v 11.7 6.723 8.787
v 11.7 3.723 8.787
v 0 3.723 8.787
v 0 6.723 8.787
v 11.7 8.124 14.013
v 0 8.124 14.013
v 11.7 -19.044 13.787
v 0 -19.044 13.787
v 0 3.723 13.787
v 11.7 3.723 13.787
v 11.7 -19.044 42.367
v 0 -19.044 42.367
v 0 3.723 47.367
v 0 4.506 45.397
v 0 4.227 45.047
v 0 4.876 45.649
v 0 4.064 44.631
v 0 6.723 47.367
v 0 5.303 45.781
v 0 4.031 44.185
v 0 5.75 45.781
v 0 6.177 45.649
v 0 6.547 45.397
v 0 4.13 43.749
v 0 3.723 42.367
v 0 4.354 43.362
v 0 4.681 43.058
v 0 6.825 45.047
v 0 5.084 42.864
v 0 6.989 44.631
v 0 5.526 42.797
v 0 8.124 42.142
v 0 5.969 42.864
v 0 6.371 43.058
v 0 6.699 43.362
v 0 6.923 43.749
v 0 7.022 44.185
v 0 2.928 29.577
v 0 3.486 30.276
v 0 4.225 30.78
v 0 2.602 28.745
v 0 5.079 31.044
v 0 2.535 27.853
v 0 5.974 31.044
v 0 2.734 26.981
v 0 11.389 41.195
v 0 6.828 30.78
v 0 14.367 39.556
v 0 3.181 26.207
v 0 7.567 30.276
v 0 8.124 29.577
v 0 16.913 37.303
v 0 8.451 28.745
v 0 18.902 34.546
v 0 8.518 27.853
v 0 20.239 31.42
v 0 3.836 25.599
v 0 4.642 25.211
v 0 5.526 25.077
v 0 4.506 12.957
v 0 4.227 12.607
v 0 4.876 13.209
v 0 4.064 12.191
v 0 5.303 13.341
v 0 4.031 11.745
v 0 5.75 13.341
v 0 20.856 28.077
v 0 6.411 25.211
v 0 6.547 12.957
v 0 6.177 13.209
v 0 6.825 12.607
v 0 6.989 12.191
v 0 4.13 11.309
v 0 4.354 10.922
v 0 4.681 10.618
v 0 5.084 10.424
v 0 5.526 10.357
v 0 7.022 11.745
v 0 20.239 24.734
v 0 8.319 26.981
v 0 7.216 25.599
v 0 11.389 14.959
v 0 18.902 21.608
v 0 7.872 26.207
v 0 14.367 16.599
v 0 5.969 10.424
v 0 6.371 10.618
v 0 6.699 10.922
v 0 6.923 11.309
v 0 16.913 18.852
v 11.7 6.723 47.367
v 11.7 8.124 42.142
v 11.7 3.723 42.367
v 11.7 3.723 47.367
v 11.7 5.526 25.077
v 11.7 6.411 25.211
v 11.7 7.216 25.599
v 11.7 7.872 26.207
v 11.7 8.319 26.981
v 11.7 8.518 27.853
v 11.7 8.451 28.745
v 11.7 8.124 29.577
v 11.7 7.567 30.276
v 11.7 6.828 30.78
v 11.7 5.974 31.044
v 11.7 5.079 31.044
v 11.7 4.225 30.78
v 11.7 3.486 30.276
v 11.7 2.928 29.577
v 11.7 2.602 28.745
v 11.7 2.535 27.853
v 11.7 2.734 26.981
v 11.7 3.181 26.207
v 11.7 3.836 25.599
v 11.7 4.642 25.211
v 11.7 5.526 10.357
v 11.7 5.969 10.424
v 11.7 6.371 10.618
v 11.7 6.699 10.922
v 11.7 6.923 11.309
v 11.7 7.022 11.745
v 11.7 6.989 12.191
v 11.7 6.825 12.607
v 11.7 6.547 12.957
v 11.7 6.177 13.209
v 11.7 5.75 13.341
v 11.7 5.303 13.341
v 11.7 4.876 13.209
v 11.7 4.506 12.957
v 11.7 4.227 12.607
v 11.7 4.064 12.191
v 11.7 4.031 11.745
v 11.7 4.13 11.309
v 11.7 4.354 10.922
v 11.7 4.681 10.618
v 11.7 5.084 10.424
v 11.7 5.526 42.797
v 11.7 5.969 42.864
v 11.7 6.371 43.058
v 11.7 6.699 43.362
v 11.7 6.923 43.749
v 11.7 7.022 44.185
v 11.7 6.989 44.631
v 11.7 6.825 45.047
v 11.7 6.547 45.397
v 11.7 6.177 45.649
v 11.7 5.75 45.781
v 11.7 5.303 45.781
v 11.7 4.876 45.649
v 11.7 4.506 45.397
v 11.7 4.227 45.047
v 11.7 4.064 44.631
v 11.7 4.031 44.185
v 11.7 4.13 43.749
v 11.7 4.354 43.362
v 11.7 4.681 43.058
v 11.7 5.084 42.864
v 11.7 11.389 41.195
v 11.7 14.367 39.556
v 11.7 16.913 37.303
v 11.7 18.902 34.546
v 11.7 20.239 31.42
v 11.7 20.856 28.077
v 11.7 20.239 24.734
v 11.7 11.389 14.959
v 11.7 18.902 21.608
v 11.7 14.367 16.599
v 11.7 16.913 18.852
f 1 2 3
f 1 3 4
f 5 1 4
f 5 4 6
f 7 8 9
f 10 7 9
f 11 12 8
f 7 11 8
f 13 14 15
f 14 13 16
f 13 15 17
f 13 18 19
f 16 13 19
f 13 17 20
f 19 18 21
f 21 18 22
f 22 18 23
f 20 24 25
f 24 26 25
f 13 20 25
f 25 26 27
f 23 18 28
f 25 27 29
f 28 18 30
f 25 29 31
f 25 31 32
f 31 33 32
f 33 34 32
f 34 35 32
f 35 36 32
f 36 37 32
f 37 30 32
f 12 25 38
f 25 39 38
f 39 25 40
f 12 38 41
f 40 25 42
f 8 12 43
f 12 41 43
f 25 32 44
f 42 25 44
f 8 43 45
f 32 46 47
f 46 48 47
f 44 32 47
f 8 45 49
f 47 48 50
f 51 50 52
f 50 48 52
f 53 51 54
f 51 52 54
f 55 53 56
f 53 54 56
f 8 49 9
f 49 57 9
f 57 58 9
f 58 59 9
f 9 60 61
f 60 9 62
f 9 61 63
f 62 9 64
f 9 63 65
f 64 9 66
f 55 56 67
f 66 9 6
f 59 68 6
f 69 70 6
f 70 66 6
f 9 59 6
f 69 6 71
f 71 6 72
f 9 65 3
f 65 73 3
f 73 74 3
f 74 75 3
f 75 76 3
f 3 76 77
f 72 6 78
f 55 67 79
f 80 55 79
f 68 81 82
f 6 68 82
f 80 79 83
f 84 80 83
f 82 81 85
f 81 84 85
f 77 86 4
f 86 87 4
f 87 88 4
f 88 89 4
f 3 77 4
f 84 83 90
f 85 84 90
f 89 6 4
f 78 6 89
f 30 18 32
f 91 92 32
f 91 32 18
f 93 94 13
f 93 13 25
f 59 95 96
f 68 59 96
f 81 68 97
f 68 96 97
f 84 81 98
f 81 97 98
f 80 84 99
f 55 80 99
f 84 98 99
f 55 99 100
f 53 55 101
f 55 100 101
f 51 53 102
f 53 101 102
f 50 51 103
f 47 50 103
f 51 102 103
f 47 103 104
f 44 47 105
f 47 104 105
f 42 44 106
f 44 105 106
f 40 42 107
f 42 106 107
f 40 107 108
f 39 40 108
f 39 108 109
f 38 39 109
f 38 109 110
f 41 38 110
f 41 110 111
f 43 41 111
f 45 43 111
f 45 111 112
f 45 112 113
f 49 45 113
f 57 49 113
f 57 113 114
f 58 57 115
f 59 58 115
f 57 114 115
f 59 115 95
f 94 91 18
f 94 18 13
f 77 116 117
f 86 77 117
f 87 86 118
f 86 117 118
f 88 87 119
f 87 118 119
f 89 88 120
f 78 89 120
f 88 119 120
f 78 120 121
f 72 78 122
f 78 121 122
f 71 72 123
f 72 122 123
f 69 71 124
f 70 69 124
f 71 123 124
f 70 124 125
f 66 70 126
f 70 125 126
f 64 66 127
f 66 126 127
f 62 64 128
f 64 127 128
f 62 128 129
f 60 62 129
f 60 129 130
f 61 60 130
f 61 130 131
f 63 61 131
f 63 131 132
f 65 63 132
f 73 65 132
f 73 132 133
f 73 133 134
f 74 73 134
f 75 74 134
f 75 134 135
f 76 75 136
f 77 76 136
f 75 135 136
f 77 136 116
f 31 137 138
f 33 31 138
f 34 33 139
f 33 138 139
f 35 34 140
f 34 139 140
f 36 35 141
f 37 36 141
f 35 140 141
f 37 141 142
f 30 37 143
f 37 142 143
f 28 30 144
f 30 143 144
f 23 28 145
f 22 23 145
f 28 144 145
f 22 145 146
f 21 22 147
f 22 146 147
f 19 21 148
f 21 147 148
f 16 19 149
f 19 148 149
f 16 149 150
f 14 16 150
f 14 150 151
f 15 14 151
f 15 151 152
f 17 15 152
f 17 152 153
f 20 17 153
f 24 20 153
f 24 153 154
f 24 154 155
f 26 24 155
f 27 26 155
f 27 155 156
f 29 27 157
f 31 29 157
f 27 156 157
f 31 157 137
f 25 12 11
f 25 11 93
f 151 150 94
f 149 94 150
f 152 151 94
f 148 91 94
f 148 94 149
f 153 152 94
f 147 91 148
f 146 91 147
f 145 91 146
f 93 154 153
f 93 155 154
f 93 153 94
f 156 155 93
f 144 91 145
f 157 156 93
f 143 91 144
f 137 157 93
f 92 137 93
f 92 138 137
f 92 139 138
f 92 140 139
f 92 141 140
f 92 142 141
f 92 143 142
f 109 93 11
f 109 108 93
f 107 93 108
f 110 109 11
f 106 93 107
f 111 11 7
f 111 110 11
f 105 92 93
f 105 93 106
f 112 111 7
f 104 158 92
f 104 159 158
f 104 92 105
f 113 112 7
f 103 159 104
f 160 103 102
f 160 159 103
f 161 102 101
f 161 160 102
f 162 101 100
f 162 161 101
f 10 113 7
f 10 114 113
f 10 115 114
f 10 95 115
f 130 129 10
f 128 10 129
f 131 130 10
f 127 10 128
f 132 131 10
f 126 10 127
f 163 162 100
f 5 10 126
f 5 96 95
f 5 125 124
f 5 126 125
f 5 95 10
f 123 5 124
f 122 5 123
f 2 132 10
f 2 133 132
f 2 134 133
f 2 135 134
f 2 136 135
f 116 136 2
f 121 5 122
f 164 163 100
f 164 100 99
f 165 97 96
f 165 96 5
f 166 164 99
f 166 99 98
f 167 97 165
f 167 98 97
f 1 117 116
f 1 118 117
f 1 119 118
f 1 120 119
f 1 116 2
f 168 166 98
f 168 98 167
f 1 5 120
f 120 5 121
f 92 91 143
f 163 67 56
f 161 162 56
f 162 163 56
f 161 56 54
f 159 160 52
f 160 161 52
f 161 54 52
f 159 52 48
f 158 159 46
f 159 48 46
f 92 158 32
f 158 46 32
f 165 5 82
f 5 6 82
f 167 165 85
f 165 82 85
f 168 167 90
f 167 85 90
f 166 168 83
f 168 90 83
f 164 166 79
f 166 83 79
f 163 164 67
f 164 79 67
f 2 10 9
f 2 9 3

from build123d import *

# Parameters (mm, degrees)
SKETCH2_W           = 28.58
SKETCH2_H           = 39.94
BOSS_EXTRUDE1_DEPTH = 11.7
FILLET1_R           = 15.4
BOSS_EXTRUDE2_DEPTH = 11.7
SKETCH3_R           = 1.5
CUT_EXTRUDE1_DEPTH  = 11.7
SKETCH6_R           = 3
CUT_EXTRUDE2_DEPTH  = 11.7


with BuildPart() as part:
    # Sketch2 → Boss-Extrude1 (new body)
    with BuildSketch(Plane(origin=(0, 0, 0), x_dir=(0, 0, -1), z_dir=(1, 0, 0))):
        with Locations((-28.077336683, 0.926432161)):
            Rectangle(SKETCH2_W, SKETCH2_H)
    extrude(amount=BOSS_EXTRUDE1_DEPTH)

    # Fillet1
    # the kernel refuses this fillet: 15.4 mm, written as the material it takes off along each edge
    with BuildSketch(Plane(origin=(-38.5, 20.896432161, 13.787336683), x_dir=(0, -1, 0), z_dir=(1, 0, 0))) as fillet1_piece_1:
        with BuildLine():
            CenterArc((FILLET1_R, -FILLET1_R), FILLET1_R, 90, 90)
            Line((0, -FILLET1_R), (0, 0))
            Line((0, 0), (FILLET1_R, 0))
        make_face()
    extrude(amount=88.7, mode=Mode.SUBTRACT)
    with BuildSketch(Plane(origin=(-38.5, 20.896432161, 42.367336683), x_dir=(0, -1, 0), z_dir=(1, 0, 0))) as fillet1_piece_2:
        with BuildLine():
            CenterArc((FILLET1_R, FILLET1_R), FILLET1_R, 180, 90)
            Line((0, FILLET1_R), (0, 0))
            Line((0, 0), (FILLET1_R, 0))
        make_face()
    extrude(amount=88.7, mode=Mode.SUBTRACT)

    # Sketch5 → Boss-Extrude2 (add)
    with BuildSketch(Plane(origin=(11.7, 0, 0), x_dir=(0, 0, -1), z_dir=(1, 0, 0))):
        Polygon((-42.141577226, 8.123678622), (-47.367336683, 6.723440596), (-47.367336683, 3.723440596), (-42.367336683, 3.723440596), align=None)
        Polygon((-13.787336683, 3.723440596), (-8.787336683, 3.723440596), (-8.787336683, 6.723440596), (-14.013096141, 8.123678622), align=None)
    extrude(amount=-BOSS_EXTRUDE2_DEPTH)

    # Sketch3 → Cut-Extrude1 (cut)
    with BuildSketch(Plane(origin=(11.7, 0, 0), x_dir=(0, 0, -1), z_dir=(1, 0, 0))):
        with Locations((-44.297336683, 5.526376822)):
            Circle(SKETCH3_R)
        with Locations((-11.857336683, 5.526376822)):
            Circle(SKETCH3_R)
    extrude(amount=-CUT_EXTRUDE1_DEPTH, mode=Mode.SUBTRACT)

    # Sketch6 → Cut-Extrude2 (cut)
    with BuildSketch(Plane(origin=(11.7, 0, 0), x_dir=(0, 0, -1), z_dir=(1, 0, 0))):
        with Locations((-28.077336683, 5.526376822)):
            Circle(SKETCH6_R)
    extrude(amount=-CUT_EXTRUDE2_DEPTH, mode=Mode.SUBTRACT)


solid = part.part
